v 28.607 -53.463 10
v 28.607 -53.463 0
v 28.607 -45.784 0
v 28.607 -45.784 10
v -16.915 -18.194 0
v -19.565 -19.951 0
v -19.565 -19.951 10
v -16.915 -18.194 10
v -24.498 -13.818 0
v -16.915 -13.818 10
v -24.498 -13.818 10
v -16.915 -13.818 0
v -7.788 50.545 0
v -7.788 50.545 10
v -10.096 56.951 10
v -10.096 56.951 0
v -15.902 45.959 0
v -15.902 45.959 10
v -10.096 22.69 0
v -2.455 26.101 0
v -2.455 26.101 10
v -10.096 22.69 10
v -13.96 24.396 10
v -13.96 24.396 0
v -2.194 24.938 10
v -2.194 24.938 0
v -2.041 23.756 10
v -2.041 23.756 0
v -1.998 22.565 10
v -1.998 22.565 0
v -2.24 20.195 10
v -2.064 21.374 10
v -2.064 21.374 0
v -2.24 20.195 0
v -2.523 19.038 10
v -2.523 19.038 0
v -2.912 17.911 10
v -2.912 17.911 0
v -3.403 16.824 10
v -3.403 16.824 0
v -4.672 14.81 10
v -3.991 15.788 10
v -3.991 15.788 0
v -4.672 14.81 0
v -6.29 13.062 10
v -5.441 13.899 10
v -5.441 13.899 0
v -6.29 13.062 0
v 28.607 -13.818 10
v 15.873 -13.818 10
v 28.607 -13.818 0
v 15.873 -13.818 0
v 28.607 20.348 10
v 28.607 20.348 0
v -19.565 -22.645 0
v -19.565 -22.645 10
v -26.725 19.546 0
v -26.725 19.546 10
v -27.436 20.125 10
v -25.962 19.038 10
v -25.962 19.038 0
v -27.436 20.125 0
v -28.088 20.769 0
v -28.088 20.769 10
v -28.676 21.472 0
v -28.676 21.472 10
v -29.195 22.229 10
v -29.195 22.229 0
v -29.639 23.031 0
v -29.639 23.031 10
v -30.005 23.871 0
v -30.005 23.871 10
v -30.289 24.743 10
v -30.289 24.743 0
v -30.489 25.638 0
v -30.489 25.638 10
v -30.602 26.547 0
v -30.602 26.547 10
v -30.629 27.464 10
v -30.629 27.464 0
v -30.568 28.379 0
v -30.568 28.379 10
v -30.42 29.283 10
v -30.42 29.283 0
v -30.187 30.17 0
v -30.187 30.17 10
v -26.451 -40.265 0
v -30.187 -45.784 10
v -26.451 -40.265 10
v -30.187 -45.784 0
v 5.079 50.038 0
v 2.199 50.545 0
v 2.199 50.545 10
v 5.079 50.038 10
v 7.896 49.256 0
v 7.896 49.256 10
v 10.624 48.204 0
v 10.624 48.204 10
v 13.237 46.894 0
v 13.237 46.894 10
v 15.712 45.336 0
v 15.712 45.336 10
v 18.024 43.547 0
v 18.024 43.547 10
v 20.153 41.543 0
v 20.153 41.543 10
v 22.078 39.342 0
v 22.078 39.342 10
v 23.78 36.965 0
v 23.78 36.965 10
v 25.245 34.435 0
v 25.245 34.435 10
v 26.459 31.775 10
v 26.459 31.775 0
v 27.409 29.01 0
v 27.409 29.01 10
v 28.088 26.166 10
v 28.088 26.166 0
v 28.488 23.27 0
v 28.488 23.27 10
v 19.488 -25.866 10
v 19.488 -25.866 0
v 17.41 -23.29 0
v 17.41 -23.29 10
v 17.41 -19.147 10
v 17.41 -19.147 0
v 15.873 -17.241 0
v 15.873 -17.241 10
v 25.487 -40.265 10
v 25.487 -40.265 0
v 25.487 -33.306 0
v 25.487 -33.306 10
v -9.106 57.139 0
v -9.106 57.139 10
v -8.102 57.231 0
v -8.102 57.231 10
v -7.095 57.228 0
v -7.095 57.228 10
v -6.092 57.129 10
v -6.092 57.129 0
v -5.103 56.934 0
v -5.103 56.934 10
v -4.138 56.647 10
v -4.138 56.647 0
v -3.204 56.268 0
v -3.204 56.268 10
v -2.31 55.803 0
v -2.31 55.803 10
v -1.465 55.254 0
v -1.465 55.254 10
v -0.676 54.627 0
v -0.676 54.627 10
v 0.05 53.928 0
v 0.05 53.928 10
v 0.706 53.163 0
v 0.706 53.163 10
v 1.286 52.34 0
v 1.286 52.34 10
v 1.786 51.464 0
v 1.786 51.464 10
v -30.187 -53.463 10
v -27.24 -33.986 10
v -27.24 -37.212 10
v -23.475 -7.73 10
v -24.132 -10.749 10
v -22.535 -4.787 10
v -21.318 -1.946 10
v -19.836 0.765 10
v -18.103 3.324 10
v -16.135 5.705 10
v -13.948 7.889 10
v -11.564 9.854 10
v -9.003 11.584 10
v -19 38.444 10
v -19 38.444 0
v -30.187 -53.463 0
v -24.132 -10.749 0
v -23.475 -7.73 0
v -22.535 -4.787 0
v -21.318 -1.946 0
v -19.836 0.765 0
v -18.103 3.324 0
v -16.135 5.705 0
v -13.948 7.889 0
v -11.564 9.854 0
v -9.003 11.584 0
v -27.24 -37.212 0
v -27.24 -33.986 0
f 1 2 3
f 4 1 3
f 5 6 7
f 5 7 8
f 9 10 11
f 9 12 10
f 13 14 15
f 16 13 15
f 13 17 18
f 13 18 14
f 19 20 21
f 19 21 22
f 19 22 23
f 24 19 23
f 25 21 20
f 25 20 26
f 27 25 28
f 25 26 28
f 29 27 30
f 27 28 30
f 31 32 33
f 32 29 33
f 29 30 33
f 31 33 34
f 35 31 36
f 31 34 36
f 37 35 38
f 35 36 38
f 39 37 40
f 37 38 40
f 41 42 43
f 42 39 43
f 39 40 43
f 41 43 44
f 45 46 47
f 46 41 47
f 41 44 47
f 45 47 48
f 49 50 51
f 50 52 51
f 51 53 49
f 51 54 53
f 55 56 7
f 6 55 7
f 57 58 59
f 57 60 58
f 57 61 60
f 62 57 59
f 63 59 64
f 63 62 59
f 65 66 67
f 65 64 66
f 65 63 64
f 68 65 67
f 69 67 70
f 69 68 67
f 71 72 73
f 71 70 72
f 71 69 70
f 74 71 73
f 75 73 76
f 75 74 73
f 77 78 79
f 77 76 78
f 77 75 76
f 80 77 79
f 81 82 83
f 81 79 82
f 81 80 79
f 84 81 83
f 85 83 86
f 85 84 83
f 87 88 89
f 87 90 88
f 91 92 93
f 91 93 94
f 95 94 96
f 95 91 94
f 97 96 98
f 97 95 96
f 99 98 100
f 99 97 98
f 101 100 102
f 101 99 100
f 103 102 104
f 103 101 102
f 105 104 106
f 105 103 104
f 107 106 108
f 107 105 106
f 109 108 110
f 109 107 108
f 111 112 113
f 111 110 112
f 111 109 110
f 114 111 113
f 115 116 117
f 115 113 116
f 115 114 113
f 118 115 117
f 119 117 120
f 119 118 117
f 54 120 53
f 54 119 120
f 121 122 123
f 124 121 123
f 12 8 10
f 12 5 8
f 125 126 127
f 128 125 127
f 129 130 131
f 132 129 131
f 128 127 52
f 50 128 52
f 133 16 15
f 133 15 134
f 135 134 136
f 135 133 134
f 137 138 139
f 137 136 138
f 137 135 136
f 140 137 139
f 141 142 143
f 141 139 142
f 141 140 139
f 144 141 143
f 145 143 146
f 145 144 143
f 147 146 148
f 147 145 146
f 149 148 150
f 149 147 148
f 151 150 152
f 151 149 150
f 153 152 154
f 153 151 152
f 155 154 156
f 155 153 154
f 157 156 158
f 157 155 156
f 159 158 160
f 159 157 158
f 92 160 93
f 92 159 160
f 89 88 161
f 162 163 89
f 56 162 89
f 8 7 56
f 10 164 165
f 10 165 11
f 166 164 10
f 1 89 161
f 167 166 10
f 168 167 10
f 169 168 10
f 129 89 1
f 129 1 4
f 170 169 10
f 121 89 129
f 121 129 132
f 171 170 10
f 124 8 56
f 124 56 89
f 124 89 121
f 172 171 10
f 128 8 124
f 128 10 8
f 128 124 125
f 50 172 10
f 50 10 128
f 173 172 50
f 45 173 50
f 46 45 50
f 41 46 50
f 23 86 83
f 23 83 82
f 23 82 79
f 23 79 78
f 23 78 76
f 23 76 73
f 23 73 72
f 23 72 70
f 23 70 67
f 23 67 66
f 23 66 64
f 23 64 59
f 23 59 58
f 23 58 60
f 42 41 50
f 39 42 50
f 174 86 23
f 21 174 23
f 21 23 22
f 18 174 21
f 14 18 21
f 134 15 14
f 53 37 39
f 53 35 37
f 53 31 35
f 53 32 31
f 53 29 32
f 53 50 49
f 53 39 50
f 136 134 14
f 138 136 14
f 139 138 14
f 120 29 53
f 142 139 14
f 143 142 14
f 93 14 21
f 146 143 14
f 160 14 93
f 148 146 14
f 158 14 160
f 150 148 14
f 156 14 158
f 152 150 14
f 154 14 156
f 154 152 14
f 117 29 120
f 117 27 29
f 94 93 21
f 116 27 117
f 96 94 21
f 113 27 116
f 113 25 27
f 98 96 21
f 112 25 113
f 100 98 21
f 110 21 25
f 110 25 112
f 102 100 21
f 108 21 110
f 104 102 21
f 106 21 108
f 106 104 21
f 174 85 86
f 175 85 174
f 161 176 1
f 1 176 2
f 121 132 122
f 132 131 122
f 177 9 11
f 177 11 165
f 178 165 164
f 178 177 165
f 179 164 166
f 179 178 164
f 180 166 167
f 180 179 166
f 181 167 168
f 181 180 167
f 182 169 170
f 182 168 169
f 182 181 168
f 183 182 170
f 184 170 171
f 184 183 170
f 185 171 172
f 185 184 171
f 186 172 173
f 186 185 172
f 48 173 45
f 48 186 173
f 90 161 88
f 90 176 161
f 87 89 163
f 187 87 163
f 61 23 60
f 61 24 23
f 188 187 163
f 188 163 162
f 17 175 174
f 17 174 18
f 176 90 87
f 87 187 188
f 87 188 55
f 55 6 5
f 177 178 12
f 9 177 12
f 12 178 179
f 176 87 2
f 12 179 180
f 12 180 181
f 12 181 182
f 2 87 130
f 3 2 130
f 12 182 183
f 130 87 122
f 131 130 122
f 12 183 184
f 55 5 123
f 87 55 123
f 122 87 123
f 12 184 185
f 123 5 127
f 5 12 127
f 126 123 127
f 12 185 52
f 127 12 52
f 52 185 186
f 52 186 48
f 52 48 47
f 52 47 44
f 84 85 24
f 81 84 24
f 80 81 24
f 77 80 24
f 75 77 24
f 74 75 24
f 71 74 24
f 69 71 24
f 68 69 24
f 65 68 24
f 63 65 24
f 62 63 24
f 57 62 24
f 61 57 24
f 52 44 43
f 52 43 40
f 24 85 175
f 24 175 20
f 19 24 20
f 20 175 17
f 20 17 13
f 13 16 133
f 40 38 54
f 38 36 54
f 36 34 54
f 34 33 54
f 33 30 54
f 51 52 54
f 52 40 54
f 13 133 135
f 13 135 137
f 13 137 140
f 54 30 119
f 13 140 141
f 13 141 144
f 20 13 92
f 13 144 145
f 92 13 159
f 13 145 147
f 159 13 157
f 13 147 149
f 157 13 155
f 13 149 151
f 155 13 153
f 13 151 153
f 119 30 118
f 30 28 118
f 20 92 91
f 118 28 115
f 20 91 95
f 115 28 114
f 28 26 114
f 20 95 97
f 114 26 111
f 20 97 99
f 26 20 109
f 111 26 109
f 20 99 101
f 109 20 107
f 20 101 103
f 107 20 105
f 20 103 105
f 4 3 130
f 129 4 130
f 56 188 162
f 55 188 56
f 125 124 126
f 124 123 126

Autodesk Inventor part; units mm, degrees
ref_plane "YZ Plane" through (0, 0, 0) normal (1, 0, 0) x (0, 1, 0)
ref_plane "XZ Plane" through (0, 0, 0) normal (0, 1, 0) x (-1, 0, 0)
ref_plane "XY Plane" through (0, 0, 0) normal (0, 0, 1) x (1, 0, 0)
sketch "Boceto1" plane through (0, 0, 0) normal (0, 0, 1) x (1, 0, 0)
  line L0 (-71.1055, 70.4875) -> (71.7516, 70.4875) construction
  line L1 (71.7516, 70.4875) -> (71.7516, -69.9887) construction
  line L2 (71.7516, -69.9887) -> (-71.1055, -69.9887) construction
  line L3 (-71.1055, -69.9887) -> (-71.1055, 70.4875) construction
  line L4 (-16.344, -18.0372) -> (15.0954, -18.0372)
  point P0 (0, 0)
sketch "Boceto2" plane through (0, 0, 0) normal (0, 0, 1) x (1, 0, 0)
  line L0 (-30.1866, -53.4632) -> (28.6068, -53.4632)
  line L1 (28.6068, -53.4632) -> (28.6068, -45.7841)
  line L2 (28.6068, -45.7841) -> (25.4871, -40.2647)
  line L3 (25.4871, -40.2647) -> (25.4871, -33.3055)
  line L4 (25.4871, -33.3055) -> (19.4878, -25.8663)
  line L5 (19.4878, -25.8663) -> (17.4099, -23.2897)
  line L6 (17.4099, -23.2897) -> (17.4099, -19.147)
  line L7 (17.4099, -19.147) -> (15.8731, -17.2414)
  line L8 (15.8731, -17.2414) -> (15.8731, -13.8176)
  line L9 (15.8731, -13.8176) -> (28.6068, -13.8176)
  line L10 (28.6068, -13.8176) -> (28.6068, 15.1601)
  line L11 (-30.1866, -53.4632) -> (-30.1866, -45.7841)
  line L12 (-30.1866, -45.7841) -> (-26.4512, -40.2647)
  line L13 (-26.4512, -40.2647) -> (-27.2401, -37.2121)
  line L14 (-27.2401, -37.2121) -> (-27.2401, -33.9857)
  line L15 (-27.2401, -33.9857) -> (-19.5651, -22.6451)
  line L16 (-19.5651, -22.6451) -> (-19.5651, -19.9512)
  line L17 (-19.5651, -19.9512) -> (-16.9146, -18.1942)
  line L18 (-16.9146, -18.1942) -> (-16.9146, -13.8176)
  line L19 (-16.9146, -13.8176) -> (-24.4978, -13.8176)
  arc A0 (-6.2899, 13.0619) -> (-24.4978, -13.8176) centre (7.8446, -16.1193) ccw
  arc A1 (-6.2899, 13.0619) -> (-2.4548, 26.1011) centre (-14.9411, 22.69) ccw
  line L20 (-2.4548, 26.1011) -> (-10.0959, 22.69)
  line L21 (-10.0959, 22.69) -> (-13.96, 24.3955)
  line L22 (-13.96, 24.3955) -> (-25.9619, 19.0376)
  arc A2 (-30.1866, 30.1701) -> (-25.9619, 19.0376) centre (-21.015, 27.2828) ccw
  line L23 (-30.1866, 30.1701) -> (-19.0004, 38.444)
  line L24 (-19.0004, 38.444) -> (-15.9019, 45.9592)
  line L25 (-15.9019, 45.9592) -> (-7.7883, 50.5452)
  line L26 (-7.7883, 50.5452) -> (-10.0959, 56.9512)
  arc A3 (2.199, 50.5452) -> (-10.0959, 56.9512) centre (-7.6346, 46.6736) ccw
  arc A4 (28.6068, 20.3485) -> (2.199, 50.5452) centre (-1.5881, 20.5877) ccw
  line L27 (28.6068, 20.3485) -> (28.6068, -13.8176)
  line L28 (-16.9146, -13.8176) -> (15.8731, -13.8176)
  point P0 (0, 0)
extrude "Extrusión1" add sketch "Boceto2" along normal blind 10
sketch "Boceto3" plane through (0, 0, 10) normal (0, 0, 1) x (1, 0, 0)
  line L0 (-16.9146, -13.8176) -> (-16.9146, -18.1942) projected
  line L1 (15.8731, -17.2414) -> (15.8731, -13.8176) projected
  line L2 (-16.9146, -13.8176) -> (15.8731, -13.8176)
  line L3 (15.8731, -13.8176) -> (15.8731, -17.2414)
  line L4 (15.8731, -17.2414) -> (17.4099, -21.9355)
  line L5 (17.4099, -23.2897) -> (17.4099, -19.147) projected
  line L6 (17.4099, -21.9355) -> (17.4099, -23.2897)
  line L7 (17.4099, -23.2897) -> (18.0548, -23.9053)
  line L8 (25.4871, -40.2647) -> (25.4871, -33.3055) projected
  line L9 (29.7175, -53.186) -> (29.9979, -54.0424)
  line L10 (29.9979, -54.0424) -> (29.9979, -53.186)
  line L11 (29.9979, -53.186) -> (-30.6163, -53.186)
  line L12 (-30.6163, -53.186) -> (-30.6163, -42.5113)
  line L13 (-30.6163, -42.5113) -> (-26, -41)
  line L14 (-27.2401, -33.9857) -> (-27.2401, -37.2121) projected
  line L15 (-26, -41) -> (-27.2401, -37.2121)
  line L16 (-27.2401, -37.2121) -> (-27.2401, -33.9857)
  line L17 (-27.2401, -33.9857) -> (-19.7765, -26.1669)
  line L18 (-19.7765, -26.1669) -> (-19.7765, -18.6785)
  line L19 (-19.7765, -18.6785) -> (-15.3627, -17.2335)
  line L20 (-15.3627, -17.2335) -> (-16.9146, -13.8176)
  line L21 (0, 0) -> (-0.3092, -53.186)
  line L22 (29.7175, -53.186) -> (29.7175, -46)
  line L23 (28.6068, -45.7841) -> (25.4871, -40.2647) projected
  line L24 (29.7175, -46) -> (25.4871, -40.2647)
  line L25 (25.4871, -33.3055) -> (17.4099, -23.2897) projected
  line L26 (25.4871, -33.3055) -> (17.4099, -23.2897)
  line L27 (-24.4978, -13.8176) -> (-16.9146, -13.8176) projected
  line L28 (-16.9146, -13.8176) -> (15.8731, -13.8176)
properties part number "KINGHT 1.0"
